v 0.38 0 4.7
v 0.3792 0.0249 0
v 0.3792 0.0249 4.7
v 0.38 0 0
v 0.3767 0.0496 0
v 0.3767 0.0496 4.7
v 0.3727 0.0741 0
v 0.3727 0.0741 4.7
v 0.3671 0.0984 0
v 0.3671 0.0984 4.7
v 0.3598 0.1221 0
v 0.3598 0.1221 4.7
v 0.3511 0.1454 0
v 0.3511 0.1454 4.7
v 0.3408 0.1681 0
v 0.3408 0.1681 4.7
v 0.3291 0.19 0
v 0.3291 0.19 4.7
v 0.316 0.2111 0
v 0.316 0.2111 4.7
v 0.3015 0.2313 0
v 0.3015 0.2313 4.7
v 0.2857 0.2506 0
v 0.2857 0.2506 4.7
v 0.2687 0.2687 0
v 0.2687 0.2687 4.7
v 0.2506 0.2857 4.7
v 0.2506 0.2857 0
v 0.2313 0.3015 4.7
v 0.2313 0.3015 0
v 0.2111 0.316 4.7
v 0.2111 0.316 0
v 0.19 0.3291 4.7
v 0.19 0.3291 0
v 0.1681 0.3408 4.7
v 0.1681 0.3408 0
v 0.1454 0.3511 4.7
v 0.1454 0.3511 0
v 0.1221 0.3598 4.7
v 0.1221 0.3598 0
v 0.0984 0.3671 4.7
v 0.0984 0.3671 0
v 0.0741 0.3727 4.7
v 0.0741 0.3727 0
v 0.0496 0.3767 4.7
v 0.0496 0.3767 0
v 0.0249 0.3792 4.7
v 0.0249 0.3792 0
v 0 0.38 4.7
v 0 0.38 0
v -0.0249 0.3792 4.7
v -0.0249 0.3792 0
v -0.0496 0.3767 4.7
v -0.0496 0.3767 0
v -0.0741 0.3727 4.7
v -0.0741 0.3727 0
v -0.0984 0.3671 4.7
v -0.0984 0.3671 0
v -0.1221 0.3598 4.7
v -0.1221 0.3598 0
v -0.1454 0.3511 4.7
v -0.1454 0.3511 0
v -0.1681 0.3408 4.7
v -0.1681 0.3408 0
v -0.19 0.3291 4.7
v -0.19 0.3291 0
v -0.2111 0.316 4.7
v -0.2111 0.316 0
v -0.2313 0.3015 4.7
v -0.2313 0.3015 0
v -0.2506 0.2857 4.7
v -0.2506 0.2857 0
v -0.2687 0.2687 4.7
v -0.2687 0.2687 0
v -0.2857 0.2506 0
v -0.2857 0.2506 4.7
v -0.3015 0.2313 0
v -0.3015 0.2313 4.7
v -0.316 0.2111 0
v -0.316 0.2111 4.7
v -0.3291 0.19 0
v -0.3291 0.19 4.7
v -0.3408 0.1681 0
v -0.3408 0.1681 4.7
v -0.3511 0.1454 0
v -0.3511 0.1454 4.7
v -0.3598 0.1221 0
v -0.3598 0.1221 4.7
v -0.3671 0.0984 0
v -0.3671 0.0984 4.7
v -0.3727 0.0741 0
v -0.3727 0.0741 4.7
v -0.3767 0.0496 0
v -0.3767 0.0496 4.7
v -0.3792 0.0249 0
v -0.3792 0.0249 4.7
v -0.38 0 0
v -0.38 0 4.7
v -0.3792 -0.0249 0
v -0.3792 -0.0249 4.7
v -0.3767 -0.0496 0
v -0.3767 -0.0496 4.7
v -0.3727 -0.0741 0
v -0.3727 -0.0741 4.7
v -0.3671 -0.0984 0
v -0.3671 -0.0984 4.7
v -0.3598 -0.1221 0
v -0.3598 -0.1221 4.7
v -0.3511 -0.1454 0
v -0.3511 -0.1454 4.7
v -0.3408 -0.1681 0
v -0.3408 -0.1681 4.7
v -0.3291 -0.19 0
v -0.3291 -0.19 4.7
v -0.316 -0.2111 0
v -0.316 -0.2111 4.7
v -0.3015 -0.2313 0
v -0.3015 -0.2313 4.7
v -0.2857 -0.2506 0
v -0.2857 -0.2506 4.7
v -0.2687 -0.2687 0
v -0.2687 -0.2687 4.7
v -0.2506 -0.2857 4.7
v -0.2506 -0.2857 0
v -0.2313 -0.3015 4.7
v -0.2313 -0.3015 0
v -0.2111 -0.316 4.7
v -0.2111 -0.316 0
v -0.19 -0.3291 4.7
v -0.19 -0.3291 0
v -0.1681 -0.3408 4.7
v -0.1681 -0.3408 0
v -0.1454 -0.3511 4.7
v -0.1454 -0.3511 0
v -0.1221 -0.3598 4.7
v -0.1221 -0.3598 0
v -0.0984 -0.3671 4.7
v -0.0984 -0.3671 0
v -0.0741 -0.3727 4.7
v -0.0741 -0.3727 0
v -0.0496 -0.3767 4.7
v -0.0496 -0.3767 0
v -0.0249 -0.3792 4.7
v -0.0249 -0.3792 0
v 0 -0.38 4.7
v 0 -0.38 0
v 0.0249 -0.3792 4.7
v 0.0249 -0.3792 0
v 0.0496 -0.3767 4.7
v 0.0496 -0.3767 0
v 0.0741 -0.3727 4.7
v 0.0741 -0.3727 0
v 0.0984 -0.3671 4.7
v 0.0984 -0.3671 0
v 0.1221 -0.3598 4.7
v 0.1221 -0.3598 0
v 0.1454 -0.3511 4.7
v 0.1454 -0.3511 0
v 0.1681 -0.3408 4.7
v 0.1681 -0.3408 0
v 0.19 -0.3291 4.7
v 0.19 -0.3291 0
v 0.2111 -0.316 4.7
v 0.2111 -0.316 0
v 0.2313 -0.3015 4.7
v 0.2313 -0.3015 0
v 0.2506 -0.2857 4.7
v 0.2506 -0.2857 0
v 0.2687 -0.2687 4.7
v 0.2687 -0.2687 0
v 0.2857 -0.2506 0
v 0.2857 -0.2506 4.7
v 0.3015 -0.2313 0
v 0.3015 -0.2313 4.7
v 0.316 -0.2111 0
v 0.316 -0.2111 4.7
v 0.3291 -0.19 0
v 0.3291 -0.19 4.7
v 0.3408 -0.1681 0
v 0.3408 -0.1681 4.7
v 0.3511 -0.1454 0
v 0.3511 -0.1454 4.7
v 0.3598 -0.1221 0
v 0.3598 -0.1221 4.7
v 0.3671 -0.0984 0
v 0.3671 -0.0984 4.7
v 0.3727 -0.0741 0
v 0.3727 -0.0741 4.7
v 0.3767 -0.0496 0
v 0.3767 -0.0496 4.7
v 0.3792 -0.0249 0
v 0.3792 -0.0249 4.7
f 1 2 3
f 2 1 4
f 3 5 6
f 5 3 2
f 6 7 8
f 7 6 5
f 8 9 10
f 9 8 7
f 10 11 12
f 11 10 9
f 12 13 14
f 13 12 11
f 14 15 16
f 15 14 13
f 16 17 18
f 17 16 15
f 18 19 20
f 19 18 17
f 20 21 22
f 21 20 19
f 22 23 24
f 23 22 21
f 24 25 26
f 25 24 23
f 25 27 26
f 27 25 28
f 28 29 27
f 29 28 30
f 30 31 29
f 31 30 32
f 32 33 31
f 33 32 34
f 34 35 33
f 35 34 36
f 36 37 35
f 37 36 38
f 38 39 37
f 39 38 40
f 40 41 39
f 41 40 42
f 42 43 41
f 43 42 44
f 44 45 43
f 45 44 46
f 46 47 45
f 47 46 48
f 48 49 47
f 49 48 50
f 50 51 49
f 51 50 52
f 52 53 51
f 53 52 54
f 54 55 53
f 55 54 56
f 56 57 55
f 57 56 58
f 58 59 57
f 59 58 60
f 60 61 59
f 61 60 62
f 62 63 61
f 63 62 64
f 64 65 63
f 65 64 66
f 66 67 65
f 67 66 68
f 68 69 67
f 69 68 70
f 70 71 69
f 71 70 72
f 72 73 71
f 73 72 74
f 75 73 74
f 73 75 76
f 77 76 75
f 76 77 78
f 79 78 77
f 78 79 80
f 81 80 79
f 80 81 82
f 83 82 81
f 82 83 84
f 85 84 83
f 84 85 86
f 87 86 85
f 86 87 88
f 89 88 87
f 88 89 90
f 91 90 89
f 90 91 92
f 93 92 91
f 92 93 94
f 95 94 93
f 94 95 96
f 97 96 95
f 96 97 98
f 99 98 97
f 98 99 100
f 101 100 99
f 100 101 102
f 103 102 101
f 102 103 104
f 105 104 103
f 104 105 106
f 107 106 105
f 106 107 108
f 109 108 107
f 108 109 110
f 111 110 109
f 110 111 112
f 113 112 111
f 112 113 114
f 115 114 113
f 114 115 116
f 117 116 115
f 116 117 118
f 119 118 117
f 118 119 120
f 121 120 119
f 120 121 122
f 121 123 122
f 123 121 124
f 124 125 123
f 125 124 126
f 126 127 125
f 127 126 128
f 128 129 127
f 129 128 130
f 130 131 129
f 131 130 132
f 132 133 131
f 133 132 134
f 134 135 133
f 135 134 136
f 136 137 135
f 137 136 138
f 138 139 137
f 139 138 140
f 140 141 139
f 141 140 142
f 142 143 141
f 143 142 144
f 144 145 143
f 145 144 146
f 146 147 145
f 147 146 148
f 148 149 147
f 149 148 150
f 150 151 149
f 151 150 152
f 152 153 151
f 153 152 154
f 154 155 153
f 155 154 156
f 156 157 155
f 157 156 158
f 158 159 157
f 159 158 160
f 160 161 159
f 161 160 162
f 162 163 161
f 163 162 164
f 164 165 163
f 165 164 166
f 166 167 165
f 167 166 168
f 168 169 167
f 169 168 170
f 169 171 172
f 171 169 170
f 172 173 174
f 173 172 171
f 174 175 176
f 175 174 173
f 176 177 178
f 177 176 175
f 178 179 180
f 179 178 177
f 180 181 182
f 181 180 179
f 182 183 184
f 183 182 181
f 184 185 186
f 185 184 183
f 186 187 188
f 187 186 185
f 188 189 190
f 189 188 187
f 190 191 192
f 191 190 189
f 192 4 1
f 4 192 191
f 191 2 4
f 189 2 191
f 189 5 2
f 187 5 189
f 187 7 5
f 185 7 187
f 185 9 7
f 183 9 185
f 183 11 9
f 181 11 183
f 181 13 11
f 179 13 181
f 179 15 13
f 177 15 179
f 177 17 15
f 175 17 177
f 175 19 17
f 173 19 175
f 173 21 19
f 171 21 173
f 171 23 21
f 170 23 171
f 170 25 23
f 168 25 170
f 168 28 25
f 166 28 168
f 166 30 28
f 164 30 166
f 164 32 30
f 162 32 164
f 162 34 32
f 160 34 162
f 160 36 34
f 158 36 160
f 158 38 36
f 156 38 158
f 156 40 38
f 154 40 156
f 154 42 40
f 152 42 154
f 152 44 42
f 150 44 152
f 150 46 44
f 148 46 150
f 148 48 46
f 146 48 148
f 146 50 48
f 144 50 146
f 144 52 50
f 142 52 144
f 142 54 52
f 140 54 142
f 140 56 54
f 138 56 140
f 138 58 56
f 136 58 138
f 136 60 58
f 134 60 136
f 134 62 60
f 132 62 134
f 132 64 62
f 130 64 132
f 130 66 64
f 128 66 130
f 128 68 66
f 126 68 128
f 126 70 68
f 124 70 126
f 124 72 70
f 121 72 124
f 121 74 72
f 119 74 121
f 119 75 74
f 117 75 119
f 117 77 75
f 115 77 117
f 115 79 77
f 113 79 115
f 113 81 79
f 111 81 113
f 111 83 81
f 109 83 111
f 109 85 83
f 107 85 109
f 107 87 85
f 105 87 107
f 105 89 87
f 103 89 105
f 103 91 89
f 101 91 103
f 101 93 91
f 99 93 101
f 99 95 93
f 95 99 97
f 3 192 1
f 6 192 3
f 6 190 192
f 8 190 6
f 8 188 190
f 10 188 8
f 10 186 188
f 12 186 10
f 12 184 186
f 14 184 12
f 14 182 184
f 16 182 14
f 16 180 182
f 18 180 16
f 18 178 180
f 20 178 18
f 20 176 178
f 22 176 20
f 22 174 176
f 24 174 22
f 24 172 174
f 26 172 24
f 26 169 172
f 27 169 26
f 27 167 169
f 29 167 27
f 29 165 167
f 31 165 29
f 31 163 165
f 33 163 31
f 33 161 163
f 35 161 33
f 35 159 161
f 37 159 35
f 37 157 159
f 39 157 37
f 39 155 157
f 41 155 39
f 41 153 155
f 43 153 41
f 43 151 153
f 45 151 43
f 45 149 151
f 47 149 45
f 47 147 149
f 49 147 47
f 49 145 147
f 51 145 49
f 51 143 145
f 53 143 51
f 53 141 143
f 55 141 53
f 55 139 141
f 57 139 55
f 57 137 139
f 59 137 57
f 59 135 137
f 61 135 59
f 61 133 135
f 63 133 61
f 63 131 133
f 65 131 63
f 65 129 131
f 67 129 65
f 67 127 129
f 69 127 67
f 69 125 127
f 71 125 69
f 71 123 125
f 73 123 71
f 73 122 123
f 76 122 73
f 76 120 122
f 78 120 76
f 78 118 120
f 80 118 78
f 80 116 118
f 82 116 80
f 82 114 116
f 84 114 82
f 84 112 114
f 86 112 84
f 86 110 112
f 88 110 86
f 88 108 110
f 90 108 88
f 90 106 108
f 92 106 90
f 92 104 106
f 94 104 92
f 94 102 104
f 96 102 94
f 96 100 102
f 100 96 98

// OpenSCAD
$fn = 96;

body_d = 0.76;
body_h = 4.7;

// Simple toggle switch body as a cylinder
cylinder(d = body_d, h = body_h);
